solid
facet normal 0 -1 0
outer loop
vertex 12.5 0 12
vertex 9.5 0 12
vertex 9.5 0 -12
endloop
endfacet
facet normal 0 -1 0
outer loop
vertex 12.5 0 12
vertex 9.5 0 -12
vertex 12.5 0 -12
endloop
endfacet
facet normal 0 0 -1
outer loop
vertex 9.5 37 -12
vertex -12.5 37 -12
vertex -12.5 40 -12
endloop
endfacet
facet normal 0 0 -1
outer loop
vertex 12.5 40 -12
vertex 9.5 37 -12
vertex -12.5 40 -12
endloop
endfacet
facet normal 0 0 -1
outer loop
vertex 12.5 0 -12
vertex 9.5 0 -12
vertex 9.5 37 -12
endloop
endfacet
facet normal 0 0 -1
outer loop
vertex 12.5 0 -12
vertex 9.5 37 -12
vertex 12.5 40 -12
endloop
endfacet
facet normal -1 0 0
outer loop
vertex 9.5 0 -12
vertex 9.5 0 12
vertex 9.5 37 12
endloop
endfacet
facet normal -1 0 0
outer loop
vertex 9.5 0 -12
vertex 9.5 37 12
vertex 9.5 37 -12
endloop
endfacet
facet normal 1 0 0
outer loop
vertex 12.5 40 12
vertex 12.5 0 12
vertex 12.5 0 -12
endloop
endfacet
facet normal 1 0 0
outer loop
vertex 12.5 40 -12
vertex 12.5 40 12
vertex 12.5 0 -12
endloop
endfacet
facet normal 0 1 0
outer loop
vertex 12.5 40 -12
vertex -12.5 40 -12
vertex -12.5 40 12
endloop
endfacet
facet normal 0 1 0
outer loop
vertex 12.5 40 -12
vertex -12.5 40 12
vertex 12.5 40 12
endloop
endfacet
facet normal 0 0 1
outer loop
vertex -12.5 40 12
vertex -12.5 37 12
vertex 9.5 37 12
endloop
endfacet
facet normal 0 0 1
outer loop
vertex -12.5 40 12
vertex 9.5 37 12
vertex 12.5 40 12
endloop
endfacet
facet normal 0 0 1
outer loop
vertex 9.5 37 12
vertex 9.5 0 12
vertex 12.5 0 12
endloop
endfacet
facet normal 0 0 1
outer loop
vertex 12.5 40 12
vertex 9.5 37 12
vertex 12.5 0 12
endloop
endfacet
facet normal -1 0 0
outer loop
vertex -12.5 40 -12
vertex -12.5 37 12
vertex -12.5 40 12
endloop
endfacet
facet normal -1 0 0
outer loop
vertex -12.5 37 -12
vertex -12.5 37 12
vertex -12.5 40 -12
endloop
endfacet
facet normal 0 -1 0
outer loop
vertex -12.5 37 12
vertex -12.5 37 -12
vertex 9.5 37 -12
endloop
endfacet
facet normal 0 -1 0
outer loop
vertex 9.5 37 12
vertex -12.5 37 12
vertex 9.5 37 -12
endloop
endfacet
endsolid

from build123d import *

# Parameters (mm, degrees)
P01_CONTACTTOPLEG_START = 37
SK_P01_CONTACTTOPLEG_W  = 25
SK_P01_CONTACTTOPLEG_H  = 24
P01_CONTACTTOPLEG_DEPTH = 3
SK_P02_CONTACTFACE_W    = 3
SK_P02_CONTACTFACE_H    = 24
P02_CONTACTFACE_DEPTH   = 37


with BuildPart() as part:
    # SK_P01_Contacttopleg → P01_Contacttopleg (new body)
    with BuildSketch(Plane(origin=(0, 0, 0), x_dir=(1, 0, 0), z_dir=(0, 1, 0)).offset(P01_CONTACTTOPLEG_START)):
        Rectangle(SK_P01_CONTACTTOPLEG_W, SK_P01_CONTACTTOPLEG_H)
    extrude(amount=P01_CONTACTTOPLEG_DEPTH)

    # SK_P02_Contactface → P02_Contactface (add)
    with BuildSketch(Plane(origin=(0, 0, 0), x_dir=(1, 0, 0), z_dir=(0, 1, 0))):
        with Locations((11, 0)):
            Rectangle(SK_P02_CONTACTFACE_W, SK_P02_CONTACTFACE_H)
    extrude(amount=P02_CONTACTFACE_DEPTH)


solid = part.part
